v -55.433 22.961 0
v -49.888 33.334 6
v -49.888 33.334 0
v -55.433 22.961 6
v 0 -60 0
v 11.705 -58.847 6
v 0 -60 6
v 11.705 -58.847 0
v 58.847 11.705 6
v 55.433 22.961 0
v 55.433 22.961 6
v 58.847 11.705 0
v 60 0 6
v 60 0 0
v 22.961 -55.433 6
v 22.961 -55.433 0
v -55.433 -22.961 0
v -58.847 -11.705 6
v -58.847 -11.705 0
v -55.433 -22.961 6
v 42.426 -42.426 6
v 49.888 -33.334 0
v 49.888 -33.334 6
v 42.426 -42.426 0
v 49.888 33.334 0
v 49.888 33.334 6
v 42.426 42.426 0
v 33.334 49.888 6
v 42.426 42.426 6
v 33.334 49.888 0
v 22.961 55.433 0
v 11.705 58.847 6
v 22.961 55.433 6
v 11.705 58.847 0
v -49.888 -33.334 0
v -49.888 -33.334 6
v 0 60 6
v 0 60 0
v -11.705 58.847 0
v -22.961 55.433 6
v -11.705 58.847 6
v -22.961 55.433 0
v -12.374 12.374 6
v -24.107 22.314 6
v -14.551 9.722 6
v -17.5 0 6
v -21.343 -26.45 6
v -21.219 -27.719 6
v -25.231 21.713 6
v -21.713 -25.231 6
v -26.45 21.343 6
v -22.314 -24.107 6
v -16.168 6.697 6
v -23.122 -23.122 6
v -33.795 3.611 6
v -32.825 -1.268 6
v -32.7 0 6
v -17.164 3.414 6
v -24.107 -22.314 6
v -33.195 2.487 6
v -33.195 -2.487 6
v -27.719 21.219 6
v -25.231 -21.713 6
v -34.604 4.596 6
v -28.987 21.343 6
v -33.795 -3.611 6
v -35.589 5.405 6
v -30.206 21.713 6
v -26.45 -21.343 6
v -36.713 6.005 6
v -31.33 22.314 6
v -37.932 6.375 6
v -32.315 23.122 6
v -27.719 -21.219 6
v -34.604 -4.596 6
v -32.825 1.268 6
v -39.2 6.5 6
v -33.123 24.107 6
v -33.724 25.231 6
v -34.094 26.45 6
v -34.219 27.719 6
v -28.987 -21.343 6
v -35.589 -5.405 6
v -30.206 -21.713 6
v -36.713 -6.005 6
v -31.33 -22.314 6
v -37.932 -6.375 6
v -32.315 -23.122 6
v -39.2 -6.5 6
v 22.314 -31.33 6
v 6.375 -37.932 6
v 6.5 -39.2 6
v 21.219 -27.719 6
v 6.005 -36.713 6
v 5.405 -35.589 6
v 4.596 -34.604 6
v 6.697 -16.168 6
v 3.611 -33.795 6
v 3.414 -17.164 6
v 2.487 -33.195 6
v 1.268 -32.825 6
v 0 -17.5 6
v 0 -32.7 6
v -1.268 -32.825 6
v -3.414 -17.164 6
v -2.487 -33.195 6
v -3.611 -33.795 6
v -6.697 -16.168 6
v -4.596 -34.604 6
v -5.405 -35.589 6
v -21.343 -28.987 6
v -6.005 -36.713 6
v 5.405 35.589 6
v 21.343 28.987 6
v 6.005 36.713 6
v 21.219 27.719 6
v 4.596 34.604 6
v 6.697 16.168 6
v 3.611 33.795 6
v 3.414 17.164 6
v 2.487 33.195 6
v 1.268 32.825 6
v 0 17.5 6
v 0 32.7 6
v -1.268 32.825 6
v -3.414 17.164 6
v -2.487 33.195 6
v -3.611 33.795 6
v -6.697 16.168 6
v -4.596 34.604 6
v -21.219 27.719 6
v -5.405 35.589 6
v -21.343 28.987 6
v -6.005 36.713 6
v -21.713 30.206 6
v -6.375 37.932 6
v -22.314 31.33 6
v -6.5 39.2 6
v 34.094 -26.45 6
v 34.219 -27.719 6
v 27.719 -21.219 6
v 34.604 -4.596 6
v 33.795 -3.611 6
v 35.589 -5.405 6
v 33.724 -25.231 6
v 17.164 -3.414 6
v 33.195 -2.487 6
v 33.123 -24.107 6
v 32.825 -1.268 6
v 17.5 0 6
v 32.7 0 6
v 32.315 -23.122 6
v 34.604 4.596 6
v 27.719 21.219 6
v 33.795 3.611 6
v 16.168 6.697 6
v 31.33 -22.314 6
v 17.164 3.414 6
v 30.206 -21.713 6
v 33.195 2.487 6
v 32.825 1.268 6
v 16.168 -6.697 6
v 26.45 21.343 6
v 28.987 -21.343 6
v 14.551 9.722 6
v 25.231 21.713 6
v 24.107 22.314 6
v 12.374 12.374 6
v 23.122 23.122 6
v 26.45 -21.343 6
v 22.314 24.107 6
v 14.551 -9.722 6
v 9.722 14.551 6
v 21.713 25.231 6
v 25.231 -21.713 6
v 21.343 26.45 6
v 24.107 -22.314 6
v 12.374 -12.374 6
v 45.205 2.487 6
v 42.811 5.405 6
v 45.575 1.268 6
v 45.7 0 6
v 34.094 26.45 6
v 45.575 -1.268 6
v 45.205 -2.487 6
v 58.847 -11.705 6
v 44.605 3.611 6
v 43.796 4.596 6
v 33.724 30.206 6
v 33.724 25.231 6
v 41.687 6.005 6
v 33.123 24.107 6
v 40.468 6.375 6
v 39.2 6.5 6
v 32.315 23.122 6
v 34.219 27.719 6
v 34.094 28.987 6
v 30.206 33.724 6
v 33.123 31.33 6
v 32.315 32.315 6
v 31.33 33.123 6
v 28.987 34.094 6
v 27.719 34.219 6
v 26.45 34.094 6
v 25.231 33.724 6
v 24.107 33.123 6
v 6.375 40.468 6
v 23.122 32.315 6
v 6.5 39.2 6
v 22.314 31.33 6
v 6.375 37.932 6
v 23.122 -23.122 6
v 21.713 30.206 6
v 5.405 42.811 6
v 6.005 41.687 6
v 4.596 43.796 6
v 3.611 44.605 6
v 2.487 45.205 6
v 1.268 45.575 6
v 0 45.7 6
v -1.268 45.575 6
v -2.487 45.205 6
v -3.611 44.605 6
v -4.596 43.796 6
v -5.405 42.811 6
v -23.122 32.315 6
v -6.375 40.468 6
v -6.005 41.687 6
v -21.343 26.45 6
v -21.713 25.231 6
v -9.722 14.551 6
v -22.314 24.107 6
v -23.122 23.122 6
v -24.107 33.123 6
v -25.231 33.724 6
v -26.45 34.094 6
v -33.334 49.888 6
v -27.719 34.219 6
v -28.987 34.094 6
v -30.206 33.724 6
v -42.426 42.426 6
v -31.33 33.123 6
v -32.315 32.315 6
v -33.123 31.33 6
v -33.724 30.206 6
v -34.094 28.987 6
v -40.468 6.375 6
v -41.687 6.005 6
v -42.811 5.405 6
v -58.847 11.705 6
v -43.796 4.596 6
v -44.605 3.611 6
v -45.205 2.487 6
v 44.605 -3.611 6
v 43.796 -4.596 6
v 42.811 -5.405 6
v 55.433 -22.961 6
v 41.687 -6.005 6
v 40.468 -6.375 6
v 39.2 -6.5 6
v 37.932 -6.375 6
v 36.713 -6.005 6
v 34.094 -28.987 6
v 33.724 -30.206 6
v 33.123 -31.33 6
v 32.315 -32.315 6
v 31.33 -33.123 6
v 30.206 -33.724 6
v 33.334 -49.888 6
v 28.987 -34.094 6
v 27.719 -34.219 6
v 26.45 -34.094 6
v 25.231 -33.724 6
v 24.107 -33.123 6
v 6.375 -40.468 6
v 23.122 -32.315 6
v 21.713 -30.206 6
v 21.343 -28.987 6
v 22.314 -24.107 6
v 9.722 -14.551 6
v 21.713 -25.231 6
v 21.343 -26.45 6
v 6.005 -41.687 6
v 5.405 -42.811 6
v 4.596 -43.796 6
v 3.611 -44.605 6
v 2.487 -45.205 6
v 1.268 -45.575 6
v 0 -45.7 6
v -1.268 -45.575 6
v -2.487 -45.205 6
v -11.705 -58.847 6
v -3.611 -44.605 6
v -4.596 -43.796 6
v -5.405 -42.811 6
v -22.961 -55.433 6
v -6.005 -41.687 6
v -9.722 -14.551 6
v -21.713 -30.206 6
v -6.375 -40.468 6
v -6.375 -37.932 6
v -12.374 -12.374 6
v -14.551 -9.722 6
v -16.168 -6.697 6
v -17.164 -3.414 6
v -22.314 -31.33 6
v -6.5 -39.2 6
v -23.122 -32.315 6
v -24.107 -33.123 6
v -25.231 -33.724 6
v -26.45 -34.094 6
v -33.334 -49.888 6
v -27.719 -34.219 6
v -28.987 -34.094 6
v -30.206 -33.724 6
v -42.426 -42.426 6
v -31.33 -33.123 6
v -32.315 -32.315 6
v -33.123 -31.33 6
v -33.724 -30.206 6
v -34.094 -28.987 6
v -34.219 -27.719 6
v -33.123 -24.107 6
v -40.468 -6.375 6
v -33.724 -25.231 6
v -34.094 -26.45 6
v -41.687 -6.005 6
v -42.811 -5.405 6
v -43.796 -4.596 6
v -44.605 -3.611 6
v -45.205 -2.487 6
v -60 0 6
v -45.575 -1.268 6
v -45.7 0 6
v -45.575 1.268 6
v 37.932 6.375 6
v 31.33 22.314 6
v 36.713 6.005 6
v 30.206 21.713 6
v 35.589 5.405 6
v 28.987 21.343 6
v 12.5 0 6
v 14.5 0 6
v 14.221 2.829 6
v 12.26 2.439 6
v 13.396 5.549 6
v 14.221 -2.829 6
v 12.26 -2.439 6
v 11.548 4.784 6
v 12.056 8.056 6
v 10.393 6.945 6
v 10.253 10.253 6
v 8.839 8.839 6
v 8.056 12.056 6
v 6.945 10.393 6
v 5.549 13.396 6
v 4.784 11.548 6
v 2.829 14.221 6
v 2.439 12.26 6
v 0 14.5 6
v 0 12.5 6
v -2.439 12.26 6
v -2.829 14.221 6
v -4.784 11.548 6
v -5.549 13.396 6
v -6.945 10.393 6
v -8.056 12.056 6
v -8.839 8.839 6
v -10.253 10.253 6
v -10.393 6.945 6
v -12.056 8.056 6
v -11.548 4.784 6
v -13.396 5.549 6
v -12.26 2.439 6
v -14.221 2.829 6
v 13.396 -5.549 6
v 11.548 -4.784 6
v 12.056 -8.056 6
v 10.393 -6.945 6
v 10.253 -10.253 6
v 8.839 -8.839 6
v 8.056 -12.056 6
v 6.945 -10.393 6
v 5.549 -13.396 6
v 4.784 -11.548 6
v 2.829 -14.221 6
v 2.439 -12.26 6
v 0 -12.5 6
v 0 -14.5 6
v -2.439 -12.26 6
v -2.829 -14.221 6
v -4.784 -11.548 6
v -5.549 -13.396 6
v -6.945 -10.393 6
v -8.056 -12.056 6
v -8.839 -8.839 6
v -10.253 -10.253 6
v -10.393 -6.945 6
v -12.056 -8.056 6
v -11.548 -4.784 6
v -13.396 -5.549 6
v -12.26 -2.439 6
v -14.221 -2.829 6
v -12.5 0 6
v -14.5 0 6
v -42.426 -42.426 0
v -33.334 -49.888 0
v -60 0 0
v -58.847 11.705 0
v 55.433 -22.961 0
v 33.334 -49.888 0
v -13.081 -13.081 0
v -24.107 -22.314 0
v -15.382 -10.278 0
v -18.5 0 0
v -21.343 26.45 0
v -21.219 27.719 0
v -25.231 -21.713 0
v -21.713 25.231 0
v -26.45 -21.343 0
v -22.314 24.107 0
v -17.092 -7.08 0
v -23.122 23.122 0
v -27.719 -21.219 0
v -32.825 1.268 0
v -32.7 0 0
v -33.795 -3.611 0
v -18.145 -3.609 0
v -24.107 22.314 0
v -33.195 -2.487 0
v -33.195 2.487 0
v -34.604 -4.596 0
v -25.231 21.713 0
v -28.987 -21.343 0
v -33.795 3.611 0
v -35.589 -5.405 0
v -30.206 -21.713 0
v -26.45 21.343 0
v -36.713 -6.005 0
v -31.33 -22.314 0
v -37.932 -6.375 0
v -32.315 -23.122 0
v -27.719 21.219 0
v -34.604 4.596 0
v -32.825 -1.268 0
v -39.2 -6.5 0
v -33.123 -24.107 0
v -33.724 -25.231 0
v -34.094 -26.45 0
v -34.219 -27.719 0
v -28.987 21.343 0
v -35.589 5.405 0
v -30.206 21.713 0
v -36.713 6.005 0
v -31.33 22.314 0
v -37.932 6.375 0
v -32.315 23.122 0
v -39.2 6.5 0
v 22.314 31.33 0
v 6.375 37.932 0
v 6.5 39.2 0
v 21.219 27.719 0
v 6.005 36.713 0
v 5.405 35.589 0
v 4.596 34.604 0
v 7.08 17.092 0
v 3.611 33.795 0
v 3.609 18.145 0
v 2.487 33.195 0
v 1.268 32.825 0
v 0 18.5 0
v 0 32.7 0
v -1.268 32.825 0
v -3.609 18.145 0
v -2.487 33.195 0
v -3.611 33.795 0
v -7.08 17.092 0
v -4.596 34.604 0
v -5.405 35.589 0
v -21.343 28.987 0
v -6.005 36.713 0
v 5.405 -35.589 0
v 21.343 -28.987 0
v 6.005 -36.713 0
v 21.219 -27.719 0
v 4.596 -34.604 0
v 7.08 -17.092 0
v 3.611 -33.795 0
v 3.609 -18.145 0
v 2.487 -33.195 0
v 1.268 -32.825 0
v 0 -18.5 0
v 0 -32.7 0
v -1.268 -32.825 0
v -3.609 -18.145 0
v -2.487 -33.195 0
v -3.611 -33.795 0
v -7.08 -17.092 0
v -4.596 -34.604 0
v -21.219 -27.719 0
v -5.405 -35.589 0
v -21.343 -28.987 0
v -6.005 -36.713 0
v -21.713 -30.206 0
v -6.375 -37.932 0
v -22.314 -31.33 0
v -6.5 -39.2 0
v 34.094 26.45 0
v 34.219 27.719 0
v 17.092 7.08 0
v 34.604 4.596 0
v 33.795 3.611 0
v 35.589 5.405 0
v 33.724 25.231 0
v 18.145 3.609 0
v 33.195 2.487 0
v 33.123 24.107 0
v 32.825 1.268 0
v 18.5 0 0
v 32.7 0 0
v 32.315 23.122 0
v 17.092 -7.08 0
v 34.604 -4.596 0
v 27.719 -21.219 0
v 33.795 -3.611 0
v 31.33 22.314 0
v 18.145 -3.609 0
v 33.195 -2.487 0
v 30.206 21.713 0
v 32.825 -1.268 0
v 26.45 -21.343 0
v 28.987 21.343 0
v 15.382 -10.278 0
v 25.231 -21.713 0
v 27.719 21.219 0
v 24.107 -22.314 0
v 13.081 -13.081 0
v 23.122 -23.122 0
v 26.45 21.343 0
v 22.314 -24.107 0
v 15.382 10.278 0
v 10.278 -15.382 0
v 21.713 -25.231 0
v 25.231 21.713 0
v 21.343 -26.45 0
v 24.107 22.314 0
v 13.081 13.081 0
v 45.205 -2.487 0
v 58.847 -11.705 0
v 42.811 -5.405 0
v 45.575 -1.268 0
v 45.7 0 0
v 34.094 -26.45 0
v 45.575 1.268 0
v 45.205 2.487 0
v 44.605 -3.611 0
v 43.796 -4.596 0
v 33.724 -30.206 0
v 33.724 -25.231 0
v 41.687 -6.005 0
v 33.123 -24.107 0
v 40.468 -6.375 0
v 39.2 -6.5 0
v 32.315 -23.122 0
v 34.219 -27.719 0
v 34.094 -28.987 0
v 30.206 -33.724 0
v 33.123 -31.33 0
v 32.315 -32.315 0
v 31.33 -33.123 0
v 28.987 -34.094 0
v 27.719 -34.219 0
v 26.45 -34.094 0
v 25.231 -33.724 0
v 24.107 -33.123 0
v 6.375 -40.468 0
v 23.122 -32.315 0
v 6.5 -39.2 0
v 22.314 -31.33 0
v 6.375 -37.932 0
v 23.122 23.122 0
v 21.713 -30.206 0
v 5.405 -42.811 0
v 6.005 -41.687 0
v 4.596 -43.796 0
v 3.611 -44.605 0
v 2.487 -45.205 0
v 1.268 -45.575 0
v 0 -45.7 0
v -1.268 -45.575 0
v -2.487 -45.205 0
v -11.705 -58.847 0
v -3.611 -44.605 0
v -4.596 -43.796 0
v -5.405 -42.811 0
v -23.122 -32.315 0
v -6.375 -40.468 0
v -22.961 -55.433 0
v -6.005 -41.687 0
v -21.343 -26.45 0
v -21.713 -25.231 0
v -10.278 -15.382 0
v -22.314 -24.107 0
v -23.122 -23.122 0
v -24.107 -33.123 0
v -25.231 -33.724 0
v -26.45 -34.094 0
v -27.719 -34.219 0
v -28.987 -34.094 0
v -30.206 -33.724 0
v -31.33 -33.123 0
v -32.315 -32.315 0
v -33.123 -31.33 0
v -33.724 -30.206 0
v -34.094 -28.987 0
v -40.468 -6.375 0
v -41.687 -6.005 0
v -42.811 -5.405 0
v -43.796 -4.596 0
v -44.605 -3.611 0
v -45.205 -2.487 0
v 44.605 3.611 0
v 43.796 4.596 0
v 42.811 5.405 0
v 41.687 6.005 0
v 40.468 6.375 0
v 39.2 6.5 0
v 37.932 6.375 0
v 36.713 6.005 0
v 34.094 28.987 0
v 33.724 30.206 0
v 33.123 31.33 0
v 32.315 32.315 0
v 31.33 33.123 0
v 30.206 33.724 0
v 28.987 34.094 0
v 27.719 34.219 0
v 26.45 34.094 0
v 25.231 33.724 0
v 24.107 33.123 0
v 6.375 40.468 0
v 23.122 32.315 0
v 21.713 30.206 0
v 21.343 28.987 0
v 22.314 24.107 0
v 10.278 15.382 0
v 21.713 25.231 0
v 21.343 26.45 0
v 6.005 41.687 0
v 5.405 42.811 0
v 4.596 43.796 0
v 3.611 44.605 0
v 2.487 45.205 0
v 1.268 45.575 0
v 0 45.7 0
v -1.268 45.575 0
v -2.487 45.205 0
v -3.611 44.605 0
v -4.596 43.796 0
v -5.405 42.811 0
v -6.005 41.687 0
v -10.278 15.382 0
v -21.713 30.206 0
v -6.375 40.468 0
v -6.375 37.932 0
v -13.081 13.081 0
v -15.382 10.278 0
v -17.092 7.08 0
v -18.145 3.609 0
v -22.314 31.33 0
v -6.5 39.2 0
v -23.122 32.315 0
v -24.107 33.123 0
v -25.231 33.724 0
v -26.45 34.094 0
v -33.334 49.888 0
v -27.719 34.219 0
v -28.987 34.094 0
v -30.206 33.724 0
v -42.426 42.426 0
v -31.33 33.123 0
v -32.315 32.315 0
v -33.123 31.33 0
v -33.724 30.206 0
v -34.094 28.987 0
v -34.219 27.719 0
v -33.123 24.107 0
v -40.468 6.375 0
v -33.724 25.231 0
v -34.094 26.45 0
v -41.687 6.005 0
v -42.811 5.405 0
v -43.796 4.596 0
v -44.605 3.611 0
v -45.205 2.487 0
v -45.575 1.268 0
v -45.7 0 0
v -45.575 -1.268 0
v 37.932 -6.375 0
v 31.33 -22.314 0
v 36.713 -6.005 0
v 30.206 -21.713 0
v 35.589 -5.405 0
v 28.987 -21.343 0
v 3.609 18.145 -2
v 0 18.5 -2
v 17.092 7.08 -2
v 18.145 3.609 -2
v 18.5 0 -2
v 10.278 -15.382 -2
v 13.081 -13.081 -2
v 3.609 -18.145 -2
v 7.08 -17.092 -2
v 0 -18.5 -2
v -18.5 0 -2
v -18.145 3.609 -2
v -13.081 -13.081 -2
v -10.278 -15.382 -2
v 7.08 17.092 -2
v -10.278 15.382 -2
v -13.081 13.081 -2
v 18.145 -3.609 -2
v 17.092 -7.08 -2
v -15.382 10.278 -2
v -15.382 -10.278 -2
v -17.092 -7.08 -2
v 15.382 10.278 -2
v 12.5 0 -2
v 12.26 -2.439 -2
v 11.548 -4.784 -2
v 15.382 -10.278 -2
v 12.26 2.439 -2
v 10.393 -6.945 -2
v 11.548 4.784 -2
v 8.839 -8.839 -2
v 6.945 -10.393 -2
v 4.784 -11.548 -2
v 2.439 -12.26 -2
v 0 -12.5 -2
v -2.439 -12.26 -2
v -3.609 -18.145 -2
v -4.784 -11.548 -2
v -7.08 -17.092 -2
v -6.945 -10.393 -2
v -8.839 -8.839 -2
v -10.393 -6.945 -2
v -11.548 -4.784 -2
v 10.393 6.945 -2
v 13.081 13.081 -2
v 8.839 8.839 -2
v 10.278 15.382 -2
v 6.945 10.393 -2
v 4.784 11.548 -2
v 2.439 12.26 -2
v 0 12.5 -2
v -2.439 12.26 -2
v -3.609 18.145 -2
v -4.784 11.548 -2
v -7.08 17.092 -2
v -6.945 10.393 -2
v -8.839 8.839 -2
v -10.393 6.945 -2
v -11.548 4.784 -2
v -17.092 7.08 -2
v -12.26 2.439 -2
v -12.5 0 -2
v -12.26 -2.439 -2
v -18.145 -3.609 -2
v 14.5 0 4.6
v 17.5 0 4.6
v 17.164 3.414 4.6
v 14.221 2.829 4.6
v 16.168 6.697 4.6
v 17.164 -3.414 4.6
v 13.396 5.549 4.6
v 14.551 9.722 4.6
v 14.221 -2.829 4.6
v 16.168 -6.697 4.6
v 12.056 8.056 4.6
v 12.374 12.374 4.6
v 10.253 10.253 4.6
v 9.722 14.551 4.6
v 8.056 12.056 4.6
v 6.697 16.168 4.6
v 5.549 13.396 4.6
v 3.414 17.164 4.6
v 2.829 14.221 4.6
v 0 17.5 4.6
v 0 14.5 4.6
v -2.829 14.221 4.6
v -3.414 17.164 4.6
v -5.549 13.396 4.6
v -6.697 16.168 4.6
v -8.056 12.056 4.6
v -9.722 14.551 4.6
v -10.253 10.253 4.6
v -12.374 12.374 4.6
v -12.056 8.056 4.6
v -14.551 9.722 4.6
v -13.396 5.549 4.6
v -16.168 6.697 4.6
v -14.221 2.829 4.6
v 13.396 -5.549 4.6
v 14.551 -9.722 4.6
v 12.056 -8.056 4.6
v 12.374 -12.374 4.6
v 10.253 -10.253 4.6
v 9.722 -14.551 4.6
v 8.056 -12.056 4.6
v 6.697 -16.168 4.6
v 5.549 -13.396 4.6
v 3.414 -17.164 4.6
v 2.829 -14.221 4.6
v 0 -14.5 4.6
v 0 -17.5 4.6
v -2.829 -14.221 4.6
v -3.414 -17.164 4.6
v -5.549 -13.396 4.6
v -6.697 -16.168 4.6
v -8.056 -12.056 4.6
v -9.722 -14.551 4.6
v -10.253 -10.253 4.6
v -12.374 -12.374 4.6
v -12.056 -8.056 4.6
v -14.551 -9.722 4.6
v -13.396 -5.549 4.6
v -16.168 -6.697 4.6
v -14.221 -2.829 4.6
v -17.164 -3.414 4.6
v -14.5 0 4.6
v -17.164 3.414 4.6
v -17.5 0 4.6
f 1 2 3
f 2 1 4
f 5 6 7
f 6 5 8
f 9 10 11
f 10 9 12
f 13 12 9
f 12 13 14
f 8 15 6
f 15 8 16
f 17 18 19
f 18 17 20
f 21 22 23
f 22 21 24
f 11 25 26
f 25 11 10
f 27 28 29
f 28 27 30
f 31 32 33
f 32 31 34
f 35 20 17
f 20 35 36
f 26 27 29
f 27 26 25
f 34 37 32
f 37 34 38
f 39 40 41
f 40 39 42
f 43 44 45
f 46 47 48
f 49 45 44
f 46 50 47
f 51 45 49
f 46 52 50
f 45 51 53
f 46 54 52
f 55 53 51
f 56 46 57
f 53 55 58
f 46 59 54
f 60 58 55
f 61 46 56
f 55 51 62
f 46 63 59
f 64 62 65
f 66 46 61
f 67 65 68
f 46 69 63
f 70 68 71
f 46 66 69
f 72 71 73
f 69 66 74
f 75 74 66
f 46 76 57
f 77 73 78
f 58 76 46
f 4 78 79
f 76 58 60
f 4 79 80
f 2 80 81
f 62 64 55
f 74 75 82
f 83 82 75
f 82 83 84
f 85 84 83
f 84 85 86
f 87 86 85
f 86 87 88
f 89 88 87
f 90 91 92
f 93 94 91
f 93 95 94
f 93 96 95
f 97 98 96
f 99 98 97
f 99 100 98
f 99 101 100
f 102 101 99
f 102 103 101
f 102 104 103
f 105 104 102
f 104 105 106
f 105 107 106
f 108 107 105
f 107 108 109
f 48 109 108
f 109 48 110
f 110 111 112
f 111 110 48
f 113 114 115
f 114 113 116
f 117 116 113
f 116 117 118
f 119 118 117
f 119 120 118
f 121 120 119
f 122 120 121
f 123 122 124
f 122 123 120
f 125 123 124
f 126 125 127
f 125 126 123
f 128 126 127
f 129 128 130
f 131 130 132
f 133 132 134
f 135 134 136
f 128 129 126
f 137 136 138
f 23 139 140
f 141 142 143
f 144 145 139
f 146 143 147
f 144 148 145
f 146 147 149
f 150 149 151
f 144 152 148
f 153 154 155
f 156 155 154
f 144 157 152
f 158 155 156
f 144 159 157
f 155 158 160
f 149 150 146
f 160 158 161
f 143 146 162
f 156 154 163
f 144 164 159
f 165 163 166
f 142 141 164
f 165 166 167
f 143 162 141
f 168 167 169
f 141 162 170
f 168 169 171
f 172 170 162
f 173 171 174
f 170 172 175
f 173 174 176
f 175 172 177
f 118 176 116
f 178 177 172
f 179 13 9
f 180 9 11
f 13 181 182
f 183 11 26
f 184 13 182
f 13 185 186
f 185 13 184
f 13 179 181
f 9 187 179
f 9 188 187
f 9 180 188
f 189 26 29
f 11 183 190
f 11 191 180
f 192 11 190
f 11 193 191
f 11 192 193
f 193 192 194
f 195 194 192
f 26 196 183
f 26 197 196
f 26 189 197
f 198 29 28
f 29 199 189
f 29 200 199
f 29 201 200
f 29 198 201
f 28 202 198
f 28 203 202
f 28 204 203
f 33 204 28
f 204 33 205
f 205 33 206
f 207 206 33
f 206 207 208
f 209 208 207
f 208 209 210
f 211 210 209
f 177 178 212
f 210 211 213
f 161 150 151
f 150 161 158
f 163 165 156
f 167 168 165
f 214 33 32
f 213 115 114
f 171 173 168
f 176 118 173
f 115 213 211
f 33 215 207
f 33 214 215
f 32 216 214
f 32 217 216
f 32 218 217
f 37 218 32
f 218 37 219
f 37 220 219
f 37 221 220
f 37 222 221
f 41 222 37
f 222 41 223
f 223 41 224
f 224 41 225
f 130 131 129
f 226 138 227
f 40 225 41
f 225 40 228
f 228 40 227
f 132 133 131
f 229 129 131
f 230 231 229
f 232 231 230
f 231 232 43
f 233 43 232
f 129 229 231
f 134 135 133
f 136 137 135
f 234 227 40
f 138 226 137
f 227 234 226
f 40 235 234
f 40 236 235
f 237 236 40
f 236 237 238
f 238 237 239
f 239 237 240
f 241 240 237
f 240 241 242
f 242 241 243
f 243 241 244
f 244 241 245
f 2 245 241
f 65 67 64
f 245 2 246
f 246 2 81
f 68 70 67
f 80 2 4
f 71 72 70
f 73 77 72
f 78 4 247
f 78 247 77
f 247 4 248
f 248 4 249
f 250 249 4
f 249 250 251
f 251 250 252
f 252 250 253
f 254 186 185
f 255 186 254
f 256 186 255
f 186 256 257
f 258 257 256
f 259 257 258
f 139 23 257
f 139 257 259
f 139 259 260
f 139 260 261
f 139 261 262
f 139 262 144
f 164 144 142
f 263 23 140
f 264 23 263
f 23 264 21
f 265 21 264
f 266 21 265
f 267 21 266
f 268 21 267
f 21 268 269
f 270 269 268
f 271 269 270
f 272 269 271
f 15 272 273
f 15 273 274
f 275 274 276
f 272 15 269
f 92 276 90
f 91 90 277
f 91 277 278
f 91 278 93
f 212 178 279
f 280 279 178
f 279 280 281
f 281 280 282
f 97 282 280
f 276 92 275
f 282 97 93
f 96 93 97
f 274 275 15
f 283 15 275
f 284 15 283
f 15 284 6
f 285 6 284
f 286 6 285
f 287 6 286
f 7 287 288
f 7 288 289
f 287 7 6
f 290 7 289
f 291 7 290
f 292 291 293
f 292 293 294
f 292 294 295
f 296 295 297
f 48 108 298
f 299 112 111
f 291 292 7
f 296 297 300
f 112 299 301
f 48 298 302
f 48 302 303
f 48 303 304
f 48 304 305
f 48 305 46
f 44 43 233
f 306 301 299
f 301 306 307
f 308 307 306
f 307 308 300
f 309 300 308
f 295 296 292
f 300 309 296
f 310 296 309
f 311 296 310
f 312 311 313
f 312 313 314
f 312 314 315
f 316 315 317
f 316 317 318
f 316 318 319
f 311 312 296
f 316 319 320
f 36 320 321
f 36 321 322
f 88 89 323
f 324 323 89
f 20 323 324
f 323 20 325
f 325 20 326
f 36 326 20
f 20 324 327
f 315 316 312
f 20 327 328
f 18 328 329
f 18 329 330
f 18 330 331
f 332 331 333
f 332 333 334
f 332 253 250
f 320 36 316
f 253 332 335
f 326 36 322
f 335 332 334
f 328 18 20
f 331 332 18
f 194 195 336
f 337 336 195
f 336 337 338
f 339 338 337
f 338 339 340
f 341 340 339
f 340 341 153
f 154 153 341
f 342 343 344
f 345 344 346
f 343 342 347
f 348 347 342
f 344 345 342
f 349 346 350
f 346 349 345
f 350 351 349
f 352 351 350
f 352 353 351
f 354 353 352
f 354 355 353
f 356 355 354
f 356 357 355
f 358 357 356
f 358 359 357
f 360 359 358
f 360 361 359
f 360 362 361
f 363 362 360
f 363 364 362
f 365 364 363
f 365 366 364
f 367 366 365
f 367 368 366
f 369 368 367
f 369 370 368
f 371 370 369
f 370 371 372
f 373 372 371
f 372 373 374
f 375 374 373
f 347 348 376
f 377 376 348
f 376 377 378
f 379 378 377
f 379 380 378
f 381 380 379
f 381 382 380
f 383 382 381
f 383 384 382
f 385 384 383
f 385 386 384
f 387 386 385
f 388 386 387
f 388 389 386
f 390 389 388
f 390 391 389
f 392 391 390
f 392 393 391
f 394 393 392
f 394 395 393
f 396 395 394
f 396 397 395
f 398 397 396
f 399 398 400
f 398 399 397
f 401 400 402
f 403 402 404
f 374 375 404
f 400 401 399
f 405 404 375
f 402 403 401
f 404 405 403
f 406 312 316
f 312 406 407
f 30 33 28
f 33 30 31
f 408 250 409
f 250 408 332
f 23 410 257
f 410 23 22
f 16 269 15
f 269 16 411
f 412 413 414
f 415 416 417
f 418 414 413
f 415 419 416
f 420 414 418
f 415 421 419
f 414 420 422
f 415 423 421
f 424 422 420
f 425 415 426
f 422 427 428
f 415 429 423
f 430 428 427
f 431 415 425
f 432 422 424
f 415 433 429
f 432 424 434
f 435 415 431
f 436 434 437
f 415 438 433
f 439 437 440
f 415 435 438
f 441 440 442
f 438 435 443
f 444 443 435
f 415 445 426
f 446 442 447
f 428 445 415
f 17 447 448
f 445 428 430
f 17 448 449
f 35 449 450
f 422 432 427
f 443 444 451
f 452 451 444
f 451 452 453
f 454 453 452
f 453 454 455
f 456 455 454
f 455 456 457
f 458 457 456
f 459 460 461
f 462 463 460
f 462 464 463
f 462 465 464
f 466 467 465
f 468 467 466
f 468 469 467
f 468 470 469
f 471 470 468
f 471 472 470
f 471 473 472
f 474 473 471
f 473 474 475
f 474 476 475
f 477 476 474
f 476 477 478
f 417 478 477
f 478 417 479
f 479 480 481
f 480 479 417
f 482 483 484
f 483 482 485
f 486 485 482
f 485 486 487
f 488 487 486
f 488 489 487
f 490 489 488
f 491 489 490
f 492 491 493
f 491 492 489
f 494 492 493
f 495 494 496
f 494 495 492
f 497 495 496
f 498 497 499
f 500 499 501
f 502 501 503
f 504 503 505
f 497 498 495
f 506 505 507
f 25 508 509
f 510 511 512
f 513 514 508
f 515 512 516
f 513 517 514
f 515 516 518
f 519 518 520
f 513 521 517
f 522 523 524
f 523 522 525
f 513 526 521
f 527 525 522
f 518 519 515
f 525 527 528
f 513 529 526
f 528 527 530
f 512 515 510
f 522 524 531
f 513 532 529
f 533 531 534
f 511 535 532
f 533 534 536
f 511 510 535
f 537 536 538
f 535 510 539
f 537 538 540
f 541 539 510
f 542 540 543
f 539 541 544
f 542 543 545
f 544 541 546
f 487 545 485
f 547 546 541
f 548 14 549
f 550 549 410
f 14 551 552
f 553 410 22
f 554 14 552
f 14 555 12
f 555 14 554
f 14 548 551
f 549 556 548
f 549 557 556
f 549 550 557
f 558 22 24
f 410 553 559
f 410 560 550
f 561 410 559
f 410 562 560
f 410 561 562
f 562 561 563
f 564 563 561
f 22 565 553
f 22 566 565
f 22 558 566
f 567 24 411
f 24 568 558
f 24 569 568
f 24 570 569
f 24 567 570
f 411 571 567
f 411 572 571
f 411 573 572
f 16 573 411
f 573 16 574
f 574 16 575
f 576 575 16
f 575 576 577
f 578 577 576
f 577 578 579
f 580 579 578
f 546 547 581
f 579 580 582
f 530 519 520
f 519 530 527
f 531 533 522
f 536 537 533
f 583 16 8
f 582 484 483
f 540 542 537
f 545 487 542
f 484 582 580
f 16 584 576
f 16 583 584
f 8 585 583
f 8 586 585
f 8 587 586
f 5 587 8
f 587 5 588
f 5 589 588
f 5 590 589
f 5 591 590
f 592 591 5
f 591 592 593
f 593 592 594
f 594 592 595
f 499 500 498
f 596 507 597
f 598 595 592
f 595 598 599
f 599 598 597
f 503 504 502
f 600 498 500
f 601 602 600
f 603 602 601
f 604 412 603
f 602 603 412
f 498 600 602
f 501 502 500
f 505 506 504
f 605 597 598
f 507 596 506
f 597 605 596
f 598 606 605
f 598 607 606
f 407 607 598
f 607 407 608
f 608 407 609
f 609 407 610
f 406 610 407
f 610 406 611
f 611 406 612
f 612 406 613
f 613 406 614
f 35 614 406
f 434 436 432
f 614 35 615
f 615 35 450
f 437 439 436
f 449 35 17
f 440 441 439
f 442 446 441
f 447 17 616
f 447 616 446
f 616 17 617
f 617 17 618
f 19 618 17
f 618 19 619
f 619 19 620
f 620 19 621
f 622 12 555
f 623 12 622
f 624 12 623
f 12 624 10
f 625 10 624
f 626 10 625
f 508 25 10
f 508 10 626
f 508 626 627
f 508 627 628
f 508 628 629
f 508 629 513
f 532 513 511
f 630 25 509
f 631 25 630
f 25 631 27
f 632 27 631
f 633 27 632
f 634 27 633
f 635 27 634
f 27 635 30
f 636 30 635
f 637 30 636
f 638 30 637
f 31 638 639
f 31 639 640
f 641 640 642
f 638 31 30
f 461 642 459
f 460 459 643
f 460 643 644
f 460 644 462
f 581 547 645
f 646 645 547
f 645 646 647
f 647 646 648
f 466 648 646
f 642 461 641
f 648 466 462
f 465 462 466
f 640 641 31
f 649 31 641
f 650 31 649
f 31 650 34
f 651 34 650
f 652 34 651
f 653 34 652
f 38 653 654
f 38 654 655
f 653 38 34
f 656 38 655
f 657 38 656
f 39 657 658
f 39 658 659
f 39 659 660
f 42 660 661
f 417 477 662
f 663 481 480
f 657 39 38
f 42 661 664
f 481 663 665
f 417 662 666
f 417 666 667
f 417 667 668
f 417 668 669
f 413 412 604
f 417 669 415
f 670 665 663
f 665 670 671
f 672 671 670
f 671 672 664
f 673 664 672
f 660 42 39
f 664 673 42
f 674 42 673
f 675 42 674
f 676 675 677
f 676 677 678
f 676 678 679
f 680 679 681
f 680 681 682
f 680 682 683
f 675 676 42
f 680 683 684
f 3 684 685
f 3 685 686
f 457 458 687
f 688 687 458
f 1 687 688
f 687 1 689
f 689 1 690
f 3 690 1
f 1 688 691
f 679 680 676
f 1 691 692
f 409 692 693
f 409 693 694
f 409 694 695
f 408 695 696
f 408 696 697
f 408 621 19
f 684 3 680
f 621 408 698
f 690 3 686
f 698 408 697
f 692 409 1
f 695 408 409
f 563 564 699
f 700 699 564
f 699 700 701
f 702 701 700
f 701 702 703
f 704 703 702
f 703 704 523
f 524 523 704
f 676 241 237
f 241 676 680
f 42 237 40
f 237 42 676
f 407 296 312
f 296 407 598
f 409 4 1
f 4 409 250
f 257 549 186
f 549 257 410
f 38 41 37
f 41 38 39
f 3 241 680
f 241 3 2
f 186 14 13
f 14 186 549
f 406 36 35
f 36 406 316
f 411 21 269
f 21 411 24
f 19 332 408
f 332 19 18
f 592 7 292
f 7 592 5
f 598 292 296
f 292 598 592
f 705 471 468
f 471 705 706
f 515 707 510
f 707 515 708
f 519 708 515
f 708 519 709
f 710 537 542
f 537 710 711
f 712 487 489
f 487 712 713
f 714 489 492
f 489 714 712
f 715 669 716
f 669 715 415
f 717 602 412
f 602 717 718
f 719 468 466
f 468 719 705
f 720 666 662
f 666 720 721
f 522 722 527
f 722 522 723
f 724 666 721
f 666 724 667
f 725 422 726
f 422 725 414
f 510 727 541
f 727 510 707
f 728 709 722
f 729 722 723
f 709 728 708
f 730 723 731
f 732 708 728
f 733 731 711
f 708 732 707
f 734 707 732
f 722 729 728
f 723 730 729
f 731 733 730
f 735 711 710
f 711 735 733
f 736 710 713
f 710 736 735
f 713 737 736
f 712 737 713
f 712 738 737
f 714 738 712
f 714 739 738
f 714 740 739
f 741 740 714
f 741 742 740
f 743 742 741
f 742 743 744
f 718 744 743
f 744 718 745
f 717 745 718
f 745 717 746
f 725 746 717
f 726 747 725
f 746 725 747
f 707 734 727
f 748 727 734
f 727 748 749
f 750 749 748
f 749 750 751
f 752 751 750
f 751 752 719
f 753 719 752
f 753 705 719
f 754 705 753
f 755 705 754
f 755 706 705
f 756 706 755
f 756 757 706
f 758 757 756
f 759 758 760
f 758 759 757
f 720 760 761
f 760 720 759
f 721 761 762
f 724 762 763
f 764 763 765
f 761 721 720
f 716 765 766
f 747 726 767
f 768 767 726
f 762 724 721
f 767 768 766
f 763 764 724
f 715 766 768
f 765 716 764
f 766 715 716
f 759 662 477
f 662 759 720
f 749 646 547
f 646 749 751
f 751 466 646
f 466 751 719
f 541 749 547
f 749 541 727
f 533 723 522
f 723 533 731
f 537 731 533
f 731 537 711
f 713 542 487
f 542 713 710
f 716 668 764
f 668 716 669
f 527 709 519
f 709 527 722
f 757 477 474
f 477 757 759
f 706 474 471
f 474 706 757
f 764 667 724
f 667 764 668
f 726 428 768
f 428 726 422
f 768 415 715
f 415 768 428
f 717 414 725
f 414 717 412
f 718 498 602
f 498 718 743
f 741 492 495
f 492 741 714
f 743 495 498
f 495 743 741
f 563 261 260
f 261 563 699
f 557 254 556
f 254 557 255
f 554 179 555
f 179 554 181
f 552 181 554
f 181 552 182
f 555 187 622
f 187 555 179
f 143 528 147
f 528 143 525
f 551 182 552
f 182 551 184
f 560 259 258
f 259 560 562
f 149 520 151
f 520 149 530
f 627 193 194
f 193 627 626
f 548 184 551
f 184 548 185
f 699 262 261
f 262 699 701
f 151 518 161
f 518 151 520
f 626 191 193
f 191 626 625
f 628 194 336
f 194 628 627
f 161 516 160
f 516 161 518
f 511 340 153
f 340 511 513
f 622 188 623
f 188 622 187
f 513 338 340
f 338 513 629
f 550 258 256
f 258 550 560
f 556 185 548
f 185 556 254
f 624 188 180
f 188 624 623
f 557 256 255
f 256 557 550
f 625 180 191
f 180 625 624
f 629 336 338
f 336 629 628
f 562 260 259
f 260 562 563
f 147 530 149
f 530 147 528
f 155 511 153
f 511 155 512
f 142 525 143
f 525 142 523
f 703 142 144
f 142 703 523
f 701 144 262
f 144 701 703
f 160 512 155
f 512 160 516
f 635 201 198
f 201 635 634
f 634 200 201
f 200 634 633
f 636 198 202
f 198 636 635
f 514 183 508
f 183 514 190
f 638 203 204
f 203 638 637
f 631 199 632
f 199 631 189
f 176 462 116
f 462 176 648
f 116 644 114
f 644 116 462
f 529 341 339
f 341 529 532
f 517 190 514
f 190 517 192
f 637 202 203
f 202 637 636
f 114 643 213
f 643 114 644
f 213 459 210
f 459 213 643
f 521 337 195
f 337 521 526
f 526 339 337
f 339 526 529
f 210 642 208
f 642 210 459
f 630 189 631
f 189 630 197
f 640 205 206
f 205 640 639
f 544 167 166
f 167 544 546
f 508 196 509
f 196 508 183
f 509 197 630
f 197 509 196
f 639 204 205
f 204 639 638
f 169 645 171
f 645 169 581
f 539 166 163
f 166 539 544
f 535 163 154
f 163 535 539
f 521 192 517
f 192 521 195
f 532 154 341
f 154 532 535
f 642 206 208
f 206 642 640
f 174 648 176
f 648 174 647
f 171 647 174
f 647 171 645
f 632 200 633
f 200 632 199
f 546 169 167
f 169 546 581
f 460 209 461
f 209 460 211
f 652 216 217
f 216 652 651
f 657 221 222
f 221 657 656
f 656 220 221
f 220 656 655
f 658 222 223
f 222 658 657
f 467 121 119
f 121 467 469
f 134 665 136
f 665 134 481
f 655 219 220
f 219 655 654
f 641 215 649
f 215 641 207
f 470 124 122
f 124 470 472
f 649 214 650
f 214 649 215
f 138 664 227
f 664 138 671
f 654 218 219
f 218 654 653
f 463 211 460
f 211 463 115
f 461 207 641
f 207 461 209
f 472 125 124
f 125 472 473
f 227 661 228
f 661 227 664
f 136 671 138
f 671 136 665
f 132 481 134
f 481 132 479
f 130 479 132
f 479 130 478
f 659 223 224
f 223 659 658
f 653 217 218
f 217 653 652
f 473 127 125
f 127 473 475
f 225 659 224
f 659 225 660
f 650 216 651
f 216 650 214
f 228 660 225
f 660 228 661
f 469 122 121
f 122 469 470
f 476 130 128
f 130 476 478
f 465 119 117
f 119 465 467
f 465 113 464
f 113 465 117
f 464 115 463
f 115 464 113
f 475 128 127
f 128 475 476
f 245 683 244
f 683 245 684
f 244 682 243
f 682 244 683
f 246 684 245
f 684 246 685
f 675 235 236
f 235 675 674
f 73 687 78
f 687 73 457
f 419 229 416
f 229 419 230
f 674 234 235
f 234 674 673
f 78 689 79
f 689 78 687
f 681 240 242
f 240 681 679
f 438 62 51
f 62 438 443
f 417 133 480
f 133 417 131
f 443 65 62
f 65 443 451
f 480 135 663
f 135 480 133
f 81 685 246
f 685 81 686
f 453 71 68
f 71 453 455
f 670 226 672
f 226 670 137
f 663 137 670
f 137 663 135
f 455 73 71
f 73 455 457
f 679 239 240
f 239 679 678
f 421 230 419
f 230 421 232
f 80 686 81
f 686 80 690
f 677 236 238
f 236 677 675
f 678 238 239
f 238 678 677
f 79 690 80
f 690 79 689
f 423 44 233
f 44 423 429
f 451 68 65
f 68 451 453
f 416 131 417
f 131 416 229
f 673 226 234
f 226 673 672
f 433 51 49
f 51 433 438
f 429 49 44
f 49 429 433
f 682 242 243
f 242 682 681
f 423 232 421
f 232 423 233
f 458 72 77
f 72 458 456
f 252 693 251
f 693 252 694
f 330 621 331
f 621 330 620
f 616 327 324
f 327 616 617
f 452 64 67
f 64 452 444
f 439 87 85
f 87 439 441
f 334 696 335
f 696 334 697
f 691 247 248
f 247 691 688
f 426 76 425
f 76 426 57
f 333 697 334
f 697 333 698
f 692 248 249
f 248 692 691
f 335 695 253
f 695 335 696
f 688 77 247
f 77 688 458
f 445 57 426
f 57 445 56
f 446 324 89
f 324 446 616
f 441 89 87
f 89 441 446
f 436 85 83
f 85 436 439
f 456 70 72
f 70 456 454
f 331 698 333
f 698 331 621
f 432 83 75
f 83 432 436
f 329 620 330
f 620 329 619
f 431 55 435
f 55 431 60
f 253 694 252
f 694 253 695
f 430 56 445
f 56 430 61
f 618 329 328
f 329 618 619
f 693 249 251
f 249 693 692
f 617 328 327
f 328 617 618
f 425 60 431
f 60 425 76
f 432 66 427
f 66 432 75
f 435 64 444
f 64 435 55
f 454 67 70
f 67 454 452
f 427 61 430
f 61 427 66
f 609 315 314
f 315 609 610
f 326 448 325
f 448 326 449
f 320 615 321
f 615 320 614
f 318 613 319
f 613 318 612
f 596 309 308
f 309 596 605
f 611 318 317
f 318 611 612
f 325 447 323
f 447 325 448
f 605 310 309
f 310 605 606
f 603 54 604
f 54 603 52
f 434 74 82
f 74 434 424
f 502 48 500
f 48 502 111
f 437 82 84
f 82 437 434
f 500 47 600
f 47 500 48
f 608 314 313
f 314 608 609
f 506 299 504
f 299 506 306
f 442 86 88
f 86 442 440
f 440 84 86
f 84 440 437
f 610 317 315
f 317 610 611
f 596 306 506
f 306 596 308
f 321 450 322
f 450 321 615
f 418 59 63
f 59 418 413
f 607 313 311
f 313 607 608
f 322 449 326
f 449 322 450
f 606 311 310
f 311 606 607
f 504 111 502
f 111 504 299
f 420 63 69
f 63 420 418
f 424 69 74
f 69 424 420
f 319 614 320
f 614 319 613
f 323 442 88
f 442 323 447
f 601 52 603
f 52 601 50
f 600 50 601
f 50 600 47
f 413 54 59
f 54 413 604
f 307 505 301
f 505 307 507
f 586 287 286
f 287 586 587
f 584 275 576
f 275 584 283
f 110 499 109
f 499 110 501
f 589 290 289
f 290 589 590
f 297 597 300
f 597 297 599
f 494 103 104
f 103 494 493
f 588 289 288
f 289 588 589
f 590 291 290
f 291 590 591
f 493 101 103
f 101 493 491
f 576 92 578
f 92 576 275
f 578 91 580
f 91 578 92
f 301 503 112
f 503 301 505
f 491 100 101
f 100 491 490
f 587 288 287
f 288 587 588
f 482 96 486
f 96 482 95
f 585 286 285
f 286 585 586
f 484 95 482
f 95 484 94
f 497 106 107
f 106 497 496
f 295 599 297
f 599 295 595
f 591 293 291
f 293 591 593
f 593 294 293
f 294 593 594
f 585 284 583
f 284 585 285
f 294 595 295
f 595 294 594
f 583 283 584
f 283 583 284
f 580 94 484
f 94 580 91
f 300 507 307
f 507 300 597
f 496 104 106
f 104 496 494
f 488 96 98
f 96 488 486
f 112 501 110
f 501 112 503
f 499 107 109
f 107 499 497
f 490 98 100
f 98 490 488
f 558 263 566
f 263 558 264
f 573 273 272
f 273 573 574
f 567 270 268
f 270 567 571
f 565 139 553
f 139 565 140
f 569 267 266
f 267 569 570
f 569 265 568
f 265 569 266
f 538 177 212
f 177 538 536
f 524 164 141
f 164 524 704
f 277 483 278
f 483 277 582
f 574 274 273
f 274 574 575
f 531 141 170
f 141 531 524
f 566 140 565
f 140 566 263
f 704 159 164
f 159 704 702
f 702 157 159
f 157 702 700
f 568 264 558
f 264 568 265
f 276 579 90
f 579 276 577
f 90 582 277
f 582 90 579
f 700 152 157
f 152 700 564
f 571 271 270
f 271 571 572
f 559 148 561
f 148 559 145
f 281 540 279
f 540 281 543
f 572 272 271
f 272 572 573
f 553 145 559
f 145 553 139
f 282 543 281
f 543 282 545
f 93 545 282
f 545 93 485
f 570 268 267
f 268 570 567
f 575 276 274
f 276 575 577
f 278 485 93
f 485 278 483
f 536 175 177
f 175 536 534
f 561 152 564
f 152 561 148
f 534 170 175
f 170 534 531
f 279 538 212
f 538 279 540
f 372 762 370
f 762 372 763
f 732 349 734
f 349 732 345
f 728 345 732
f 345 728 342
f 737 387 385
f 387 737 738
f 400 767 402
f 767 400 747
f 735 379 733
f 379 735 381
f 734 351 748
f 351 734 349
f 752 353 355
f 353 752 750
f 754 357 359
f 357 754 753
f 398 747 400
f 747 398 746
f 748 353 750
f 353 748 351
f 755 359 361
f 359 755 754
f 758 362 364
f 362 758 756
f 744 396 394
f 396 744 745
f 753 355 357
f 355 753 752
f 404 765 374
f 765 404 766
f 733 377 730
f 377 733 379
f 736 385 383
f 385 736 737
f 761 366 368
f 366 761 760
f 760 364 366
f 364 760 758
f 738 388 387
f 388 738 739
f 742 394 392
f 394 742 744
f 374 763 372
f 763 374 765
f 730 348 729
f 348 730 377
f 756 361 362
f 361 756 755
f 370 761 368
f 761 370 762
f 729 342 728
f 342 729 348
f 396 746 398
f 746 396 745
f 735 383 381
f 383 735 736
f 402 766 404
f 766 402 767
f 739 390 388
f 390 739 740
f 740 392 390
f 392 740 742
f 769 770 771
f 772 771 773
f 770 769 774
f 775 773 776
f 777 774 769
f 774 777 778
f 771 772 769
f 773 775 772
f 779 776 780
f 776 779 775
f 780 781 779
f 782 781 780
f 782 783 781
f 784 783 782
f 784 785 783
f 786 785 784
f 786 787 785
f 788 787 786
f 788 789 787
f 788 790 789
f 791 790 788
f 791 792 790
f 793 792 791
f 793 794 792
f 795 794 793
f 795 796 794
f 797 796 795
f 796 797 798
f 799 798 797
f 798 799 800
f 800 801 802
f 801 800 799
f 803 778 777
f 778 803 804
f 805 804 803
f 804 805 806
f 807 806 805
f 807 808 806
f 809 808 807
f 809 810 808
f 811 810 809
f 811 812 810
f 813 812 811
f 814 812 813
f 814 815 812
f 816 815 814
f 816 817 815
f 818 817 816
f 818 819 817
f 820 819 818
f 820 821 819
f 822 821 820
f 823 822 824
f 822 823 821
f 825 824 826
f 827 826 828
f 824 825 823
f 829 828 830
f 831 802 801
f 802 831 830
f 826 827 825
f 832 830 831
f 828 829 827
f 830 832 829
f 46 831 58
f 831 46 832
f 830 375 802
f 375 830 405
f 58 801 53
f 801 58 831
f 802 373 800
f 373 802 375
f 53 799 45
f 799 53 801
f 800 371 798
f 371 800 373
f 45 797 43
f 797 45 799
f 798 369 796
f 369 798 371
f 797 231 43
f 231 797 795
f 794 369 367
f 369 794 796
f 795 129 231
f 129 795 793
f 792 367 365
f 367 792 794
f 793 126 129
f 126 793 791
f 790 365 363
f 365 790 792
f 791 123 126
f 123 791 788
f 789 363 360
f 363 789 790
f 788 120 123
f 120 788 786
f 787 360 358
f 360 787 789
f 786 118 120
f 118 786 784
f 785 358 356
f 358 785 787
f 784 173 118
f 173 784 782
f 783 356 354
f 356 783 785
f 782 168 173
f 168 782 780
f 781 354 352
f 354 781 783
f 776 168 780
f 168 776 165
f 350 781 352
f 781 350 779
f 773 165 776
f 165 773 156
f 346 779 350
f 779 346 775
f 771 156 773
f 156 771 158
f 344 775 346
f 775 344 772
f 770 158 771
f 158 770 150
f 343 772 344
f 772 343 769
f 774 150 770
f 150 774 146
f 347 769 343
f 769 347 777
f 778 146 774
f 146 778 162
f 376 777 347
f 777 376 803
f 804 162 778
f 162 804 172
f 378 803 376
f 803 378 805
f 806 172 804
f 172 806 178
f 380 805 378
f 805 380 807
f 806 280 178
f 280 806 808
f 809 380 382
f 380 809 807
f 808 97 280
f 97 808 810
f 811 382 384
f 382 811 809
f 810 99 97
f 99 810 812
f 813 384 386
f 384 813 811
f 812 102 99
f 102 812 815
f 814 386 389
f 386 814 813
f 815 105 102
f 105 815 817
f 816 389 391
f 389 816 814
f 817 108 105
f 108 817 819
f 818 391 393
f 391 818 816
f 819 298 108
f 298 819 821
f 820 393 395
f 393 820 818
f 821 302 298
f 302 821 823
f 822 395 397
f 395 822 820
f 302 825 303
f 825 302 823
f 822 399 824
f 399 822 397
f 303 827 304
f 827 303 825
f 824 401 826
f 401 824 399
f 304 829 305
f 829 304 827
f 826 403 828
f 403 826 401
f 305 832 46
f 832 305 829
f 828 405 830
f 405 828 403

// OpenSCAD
$fn = 32;

// ----------------------------------------------------------------------
// Bolt-circle flange: 120 mm outside, 8 bolt holes, bore 25 mm
// ----------------------------------------------------------------------

// --- parameters (mm) ---
flange_d = 120;           // flange outside diameter
flange_t = 6;             // flange thickness
bolts = 8;                // number of bolt holes
bolt_d = 13;              // bolt clearance
bolt_r = 39.2;            // bolt circle radius
bore_d = 25;              // centre bore
spigot_d = 37;            // spigot diameter
spigot_h = 3;             // spigot height below the flange
sink = 1;                 // overlap into the flange
groove_w = 3;             // gasket groove width
groove_d = 1.4;           // gasket groove depth
groove_r = 14.5;          // groove radius
groove_z = 4.6;           // groove floor depth from the face

module body() {
  cylinder(h = flange_t, d = flange_d);
  /* spigot on the back face, sunk into the flange */
  translate([0, 0, -spigot_h + sink]) cylinder(h = spigot_h, d = spigot_d);
}

difference() {
  body();
  /* bolt circle */
  for (i = [0 : bolts - 1]) rotate([0, 0, i * 360 / bolts]) translate([bolt_r, 0, -spigot_h - 1]) cylinder(h = flange_t + spigot_h + 3, d = bolt_d);
  translate([0, 0, -spigot_h - 1]) cylinder(h = flange_t + spigot_h + 3, d = bore_d);
  /* gasket groove on the front face */
  rotate_extrude() translate([groove_r, groove_z]) square([groove_w, groove_d + 1]);
}
